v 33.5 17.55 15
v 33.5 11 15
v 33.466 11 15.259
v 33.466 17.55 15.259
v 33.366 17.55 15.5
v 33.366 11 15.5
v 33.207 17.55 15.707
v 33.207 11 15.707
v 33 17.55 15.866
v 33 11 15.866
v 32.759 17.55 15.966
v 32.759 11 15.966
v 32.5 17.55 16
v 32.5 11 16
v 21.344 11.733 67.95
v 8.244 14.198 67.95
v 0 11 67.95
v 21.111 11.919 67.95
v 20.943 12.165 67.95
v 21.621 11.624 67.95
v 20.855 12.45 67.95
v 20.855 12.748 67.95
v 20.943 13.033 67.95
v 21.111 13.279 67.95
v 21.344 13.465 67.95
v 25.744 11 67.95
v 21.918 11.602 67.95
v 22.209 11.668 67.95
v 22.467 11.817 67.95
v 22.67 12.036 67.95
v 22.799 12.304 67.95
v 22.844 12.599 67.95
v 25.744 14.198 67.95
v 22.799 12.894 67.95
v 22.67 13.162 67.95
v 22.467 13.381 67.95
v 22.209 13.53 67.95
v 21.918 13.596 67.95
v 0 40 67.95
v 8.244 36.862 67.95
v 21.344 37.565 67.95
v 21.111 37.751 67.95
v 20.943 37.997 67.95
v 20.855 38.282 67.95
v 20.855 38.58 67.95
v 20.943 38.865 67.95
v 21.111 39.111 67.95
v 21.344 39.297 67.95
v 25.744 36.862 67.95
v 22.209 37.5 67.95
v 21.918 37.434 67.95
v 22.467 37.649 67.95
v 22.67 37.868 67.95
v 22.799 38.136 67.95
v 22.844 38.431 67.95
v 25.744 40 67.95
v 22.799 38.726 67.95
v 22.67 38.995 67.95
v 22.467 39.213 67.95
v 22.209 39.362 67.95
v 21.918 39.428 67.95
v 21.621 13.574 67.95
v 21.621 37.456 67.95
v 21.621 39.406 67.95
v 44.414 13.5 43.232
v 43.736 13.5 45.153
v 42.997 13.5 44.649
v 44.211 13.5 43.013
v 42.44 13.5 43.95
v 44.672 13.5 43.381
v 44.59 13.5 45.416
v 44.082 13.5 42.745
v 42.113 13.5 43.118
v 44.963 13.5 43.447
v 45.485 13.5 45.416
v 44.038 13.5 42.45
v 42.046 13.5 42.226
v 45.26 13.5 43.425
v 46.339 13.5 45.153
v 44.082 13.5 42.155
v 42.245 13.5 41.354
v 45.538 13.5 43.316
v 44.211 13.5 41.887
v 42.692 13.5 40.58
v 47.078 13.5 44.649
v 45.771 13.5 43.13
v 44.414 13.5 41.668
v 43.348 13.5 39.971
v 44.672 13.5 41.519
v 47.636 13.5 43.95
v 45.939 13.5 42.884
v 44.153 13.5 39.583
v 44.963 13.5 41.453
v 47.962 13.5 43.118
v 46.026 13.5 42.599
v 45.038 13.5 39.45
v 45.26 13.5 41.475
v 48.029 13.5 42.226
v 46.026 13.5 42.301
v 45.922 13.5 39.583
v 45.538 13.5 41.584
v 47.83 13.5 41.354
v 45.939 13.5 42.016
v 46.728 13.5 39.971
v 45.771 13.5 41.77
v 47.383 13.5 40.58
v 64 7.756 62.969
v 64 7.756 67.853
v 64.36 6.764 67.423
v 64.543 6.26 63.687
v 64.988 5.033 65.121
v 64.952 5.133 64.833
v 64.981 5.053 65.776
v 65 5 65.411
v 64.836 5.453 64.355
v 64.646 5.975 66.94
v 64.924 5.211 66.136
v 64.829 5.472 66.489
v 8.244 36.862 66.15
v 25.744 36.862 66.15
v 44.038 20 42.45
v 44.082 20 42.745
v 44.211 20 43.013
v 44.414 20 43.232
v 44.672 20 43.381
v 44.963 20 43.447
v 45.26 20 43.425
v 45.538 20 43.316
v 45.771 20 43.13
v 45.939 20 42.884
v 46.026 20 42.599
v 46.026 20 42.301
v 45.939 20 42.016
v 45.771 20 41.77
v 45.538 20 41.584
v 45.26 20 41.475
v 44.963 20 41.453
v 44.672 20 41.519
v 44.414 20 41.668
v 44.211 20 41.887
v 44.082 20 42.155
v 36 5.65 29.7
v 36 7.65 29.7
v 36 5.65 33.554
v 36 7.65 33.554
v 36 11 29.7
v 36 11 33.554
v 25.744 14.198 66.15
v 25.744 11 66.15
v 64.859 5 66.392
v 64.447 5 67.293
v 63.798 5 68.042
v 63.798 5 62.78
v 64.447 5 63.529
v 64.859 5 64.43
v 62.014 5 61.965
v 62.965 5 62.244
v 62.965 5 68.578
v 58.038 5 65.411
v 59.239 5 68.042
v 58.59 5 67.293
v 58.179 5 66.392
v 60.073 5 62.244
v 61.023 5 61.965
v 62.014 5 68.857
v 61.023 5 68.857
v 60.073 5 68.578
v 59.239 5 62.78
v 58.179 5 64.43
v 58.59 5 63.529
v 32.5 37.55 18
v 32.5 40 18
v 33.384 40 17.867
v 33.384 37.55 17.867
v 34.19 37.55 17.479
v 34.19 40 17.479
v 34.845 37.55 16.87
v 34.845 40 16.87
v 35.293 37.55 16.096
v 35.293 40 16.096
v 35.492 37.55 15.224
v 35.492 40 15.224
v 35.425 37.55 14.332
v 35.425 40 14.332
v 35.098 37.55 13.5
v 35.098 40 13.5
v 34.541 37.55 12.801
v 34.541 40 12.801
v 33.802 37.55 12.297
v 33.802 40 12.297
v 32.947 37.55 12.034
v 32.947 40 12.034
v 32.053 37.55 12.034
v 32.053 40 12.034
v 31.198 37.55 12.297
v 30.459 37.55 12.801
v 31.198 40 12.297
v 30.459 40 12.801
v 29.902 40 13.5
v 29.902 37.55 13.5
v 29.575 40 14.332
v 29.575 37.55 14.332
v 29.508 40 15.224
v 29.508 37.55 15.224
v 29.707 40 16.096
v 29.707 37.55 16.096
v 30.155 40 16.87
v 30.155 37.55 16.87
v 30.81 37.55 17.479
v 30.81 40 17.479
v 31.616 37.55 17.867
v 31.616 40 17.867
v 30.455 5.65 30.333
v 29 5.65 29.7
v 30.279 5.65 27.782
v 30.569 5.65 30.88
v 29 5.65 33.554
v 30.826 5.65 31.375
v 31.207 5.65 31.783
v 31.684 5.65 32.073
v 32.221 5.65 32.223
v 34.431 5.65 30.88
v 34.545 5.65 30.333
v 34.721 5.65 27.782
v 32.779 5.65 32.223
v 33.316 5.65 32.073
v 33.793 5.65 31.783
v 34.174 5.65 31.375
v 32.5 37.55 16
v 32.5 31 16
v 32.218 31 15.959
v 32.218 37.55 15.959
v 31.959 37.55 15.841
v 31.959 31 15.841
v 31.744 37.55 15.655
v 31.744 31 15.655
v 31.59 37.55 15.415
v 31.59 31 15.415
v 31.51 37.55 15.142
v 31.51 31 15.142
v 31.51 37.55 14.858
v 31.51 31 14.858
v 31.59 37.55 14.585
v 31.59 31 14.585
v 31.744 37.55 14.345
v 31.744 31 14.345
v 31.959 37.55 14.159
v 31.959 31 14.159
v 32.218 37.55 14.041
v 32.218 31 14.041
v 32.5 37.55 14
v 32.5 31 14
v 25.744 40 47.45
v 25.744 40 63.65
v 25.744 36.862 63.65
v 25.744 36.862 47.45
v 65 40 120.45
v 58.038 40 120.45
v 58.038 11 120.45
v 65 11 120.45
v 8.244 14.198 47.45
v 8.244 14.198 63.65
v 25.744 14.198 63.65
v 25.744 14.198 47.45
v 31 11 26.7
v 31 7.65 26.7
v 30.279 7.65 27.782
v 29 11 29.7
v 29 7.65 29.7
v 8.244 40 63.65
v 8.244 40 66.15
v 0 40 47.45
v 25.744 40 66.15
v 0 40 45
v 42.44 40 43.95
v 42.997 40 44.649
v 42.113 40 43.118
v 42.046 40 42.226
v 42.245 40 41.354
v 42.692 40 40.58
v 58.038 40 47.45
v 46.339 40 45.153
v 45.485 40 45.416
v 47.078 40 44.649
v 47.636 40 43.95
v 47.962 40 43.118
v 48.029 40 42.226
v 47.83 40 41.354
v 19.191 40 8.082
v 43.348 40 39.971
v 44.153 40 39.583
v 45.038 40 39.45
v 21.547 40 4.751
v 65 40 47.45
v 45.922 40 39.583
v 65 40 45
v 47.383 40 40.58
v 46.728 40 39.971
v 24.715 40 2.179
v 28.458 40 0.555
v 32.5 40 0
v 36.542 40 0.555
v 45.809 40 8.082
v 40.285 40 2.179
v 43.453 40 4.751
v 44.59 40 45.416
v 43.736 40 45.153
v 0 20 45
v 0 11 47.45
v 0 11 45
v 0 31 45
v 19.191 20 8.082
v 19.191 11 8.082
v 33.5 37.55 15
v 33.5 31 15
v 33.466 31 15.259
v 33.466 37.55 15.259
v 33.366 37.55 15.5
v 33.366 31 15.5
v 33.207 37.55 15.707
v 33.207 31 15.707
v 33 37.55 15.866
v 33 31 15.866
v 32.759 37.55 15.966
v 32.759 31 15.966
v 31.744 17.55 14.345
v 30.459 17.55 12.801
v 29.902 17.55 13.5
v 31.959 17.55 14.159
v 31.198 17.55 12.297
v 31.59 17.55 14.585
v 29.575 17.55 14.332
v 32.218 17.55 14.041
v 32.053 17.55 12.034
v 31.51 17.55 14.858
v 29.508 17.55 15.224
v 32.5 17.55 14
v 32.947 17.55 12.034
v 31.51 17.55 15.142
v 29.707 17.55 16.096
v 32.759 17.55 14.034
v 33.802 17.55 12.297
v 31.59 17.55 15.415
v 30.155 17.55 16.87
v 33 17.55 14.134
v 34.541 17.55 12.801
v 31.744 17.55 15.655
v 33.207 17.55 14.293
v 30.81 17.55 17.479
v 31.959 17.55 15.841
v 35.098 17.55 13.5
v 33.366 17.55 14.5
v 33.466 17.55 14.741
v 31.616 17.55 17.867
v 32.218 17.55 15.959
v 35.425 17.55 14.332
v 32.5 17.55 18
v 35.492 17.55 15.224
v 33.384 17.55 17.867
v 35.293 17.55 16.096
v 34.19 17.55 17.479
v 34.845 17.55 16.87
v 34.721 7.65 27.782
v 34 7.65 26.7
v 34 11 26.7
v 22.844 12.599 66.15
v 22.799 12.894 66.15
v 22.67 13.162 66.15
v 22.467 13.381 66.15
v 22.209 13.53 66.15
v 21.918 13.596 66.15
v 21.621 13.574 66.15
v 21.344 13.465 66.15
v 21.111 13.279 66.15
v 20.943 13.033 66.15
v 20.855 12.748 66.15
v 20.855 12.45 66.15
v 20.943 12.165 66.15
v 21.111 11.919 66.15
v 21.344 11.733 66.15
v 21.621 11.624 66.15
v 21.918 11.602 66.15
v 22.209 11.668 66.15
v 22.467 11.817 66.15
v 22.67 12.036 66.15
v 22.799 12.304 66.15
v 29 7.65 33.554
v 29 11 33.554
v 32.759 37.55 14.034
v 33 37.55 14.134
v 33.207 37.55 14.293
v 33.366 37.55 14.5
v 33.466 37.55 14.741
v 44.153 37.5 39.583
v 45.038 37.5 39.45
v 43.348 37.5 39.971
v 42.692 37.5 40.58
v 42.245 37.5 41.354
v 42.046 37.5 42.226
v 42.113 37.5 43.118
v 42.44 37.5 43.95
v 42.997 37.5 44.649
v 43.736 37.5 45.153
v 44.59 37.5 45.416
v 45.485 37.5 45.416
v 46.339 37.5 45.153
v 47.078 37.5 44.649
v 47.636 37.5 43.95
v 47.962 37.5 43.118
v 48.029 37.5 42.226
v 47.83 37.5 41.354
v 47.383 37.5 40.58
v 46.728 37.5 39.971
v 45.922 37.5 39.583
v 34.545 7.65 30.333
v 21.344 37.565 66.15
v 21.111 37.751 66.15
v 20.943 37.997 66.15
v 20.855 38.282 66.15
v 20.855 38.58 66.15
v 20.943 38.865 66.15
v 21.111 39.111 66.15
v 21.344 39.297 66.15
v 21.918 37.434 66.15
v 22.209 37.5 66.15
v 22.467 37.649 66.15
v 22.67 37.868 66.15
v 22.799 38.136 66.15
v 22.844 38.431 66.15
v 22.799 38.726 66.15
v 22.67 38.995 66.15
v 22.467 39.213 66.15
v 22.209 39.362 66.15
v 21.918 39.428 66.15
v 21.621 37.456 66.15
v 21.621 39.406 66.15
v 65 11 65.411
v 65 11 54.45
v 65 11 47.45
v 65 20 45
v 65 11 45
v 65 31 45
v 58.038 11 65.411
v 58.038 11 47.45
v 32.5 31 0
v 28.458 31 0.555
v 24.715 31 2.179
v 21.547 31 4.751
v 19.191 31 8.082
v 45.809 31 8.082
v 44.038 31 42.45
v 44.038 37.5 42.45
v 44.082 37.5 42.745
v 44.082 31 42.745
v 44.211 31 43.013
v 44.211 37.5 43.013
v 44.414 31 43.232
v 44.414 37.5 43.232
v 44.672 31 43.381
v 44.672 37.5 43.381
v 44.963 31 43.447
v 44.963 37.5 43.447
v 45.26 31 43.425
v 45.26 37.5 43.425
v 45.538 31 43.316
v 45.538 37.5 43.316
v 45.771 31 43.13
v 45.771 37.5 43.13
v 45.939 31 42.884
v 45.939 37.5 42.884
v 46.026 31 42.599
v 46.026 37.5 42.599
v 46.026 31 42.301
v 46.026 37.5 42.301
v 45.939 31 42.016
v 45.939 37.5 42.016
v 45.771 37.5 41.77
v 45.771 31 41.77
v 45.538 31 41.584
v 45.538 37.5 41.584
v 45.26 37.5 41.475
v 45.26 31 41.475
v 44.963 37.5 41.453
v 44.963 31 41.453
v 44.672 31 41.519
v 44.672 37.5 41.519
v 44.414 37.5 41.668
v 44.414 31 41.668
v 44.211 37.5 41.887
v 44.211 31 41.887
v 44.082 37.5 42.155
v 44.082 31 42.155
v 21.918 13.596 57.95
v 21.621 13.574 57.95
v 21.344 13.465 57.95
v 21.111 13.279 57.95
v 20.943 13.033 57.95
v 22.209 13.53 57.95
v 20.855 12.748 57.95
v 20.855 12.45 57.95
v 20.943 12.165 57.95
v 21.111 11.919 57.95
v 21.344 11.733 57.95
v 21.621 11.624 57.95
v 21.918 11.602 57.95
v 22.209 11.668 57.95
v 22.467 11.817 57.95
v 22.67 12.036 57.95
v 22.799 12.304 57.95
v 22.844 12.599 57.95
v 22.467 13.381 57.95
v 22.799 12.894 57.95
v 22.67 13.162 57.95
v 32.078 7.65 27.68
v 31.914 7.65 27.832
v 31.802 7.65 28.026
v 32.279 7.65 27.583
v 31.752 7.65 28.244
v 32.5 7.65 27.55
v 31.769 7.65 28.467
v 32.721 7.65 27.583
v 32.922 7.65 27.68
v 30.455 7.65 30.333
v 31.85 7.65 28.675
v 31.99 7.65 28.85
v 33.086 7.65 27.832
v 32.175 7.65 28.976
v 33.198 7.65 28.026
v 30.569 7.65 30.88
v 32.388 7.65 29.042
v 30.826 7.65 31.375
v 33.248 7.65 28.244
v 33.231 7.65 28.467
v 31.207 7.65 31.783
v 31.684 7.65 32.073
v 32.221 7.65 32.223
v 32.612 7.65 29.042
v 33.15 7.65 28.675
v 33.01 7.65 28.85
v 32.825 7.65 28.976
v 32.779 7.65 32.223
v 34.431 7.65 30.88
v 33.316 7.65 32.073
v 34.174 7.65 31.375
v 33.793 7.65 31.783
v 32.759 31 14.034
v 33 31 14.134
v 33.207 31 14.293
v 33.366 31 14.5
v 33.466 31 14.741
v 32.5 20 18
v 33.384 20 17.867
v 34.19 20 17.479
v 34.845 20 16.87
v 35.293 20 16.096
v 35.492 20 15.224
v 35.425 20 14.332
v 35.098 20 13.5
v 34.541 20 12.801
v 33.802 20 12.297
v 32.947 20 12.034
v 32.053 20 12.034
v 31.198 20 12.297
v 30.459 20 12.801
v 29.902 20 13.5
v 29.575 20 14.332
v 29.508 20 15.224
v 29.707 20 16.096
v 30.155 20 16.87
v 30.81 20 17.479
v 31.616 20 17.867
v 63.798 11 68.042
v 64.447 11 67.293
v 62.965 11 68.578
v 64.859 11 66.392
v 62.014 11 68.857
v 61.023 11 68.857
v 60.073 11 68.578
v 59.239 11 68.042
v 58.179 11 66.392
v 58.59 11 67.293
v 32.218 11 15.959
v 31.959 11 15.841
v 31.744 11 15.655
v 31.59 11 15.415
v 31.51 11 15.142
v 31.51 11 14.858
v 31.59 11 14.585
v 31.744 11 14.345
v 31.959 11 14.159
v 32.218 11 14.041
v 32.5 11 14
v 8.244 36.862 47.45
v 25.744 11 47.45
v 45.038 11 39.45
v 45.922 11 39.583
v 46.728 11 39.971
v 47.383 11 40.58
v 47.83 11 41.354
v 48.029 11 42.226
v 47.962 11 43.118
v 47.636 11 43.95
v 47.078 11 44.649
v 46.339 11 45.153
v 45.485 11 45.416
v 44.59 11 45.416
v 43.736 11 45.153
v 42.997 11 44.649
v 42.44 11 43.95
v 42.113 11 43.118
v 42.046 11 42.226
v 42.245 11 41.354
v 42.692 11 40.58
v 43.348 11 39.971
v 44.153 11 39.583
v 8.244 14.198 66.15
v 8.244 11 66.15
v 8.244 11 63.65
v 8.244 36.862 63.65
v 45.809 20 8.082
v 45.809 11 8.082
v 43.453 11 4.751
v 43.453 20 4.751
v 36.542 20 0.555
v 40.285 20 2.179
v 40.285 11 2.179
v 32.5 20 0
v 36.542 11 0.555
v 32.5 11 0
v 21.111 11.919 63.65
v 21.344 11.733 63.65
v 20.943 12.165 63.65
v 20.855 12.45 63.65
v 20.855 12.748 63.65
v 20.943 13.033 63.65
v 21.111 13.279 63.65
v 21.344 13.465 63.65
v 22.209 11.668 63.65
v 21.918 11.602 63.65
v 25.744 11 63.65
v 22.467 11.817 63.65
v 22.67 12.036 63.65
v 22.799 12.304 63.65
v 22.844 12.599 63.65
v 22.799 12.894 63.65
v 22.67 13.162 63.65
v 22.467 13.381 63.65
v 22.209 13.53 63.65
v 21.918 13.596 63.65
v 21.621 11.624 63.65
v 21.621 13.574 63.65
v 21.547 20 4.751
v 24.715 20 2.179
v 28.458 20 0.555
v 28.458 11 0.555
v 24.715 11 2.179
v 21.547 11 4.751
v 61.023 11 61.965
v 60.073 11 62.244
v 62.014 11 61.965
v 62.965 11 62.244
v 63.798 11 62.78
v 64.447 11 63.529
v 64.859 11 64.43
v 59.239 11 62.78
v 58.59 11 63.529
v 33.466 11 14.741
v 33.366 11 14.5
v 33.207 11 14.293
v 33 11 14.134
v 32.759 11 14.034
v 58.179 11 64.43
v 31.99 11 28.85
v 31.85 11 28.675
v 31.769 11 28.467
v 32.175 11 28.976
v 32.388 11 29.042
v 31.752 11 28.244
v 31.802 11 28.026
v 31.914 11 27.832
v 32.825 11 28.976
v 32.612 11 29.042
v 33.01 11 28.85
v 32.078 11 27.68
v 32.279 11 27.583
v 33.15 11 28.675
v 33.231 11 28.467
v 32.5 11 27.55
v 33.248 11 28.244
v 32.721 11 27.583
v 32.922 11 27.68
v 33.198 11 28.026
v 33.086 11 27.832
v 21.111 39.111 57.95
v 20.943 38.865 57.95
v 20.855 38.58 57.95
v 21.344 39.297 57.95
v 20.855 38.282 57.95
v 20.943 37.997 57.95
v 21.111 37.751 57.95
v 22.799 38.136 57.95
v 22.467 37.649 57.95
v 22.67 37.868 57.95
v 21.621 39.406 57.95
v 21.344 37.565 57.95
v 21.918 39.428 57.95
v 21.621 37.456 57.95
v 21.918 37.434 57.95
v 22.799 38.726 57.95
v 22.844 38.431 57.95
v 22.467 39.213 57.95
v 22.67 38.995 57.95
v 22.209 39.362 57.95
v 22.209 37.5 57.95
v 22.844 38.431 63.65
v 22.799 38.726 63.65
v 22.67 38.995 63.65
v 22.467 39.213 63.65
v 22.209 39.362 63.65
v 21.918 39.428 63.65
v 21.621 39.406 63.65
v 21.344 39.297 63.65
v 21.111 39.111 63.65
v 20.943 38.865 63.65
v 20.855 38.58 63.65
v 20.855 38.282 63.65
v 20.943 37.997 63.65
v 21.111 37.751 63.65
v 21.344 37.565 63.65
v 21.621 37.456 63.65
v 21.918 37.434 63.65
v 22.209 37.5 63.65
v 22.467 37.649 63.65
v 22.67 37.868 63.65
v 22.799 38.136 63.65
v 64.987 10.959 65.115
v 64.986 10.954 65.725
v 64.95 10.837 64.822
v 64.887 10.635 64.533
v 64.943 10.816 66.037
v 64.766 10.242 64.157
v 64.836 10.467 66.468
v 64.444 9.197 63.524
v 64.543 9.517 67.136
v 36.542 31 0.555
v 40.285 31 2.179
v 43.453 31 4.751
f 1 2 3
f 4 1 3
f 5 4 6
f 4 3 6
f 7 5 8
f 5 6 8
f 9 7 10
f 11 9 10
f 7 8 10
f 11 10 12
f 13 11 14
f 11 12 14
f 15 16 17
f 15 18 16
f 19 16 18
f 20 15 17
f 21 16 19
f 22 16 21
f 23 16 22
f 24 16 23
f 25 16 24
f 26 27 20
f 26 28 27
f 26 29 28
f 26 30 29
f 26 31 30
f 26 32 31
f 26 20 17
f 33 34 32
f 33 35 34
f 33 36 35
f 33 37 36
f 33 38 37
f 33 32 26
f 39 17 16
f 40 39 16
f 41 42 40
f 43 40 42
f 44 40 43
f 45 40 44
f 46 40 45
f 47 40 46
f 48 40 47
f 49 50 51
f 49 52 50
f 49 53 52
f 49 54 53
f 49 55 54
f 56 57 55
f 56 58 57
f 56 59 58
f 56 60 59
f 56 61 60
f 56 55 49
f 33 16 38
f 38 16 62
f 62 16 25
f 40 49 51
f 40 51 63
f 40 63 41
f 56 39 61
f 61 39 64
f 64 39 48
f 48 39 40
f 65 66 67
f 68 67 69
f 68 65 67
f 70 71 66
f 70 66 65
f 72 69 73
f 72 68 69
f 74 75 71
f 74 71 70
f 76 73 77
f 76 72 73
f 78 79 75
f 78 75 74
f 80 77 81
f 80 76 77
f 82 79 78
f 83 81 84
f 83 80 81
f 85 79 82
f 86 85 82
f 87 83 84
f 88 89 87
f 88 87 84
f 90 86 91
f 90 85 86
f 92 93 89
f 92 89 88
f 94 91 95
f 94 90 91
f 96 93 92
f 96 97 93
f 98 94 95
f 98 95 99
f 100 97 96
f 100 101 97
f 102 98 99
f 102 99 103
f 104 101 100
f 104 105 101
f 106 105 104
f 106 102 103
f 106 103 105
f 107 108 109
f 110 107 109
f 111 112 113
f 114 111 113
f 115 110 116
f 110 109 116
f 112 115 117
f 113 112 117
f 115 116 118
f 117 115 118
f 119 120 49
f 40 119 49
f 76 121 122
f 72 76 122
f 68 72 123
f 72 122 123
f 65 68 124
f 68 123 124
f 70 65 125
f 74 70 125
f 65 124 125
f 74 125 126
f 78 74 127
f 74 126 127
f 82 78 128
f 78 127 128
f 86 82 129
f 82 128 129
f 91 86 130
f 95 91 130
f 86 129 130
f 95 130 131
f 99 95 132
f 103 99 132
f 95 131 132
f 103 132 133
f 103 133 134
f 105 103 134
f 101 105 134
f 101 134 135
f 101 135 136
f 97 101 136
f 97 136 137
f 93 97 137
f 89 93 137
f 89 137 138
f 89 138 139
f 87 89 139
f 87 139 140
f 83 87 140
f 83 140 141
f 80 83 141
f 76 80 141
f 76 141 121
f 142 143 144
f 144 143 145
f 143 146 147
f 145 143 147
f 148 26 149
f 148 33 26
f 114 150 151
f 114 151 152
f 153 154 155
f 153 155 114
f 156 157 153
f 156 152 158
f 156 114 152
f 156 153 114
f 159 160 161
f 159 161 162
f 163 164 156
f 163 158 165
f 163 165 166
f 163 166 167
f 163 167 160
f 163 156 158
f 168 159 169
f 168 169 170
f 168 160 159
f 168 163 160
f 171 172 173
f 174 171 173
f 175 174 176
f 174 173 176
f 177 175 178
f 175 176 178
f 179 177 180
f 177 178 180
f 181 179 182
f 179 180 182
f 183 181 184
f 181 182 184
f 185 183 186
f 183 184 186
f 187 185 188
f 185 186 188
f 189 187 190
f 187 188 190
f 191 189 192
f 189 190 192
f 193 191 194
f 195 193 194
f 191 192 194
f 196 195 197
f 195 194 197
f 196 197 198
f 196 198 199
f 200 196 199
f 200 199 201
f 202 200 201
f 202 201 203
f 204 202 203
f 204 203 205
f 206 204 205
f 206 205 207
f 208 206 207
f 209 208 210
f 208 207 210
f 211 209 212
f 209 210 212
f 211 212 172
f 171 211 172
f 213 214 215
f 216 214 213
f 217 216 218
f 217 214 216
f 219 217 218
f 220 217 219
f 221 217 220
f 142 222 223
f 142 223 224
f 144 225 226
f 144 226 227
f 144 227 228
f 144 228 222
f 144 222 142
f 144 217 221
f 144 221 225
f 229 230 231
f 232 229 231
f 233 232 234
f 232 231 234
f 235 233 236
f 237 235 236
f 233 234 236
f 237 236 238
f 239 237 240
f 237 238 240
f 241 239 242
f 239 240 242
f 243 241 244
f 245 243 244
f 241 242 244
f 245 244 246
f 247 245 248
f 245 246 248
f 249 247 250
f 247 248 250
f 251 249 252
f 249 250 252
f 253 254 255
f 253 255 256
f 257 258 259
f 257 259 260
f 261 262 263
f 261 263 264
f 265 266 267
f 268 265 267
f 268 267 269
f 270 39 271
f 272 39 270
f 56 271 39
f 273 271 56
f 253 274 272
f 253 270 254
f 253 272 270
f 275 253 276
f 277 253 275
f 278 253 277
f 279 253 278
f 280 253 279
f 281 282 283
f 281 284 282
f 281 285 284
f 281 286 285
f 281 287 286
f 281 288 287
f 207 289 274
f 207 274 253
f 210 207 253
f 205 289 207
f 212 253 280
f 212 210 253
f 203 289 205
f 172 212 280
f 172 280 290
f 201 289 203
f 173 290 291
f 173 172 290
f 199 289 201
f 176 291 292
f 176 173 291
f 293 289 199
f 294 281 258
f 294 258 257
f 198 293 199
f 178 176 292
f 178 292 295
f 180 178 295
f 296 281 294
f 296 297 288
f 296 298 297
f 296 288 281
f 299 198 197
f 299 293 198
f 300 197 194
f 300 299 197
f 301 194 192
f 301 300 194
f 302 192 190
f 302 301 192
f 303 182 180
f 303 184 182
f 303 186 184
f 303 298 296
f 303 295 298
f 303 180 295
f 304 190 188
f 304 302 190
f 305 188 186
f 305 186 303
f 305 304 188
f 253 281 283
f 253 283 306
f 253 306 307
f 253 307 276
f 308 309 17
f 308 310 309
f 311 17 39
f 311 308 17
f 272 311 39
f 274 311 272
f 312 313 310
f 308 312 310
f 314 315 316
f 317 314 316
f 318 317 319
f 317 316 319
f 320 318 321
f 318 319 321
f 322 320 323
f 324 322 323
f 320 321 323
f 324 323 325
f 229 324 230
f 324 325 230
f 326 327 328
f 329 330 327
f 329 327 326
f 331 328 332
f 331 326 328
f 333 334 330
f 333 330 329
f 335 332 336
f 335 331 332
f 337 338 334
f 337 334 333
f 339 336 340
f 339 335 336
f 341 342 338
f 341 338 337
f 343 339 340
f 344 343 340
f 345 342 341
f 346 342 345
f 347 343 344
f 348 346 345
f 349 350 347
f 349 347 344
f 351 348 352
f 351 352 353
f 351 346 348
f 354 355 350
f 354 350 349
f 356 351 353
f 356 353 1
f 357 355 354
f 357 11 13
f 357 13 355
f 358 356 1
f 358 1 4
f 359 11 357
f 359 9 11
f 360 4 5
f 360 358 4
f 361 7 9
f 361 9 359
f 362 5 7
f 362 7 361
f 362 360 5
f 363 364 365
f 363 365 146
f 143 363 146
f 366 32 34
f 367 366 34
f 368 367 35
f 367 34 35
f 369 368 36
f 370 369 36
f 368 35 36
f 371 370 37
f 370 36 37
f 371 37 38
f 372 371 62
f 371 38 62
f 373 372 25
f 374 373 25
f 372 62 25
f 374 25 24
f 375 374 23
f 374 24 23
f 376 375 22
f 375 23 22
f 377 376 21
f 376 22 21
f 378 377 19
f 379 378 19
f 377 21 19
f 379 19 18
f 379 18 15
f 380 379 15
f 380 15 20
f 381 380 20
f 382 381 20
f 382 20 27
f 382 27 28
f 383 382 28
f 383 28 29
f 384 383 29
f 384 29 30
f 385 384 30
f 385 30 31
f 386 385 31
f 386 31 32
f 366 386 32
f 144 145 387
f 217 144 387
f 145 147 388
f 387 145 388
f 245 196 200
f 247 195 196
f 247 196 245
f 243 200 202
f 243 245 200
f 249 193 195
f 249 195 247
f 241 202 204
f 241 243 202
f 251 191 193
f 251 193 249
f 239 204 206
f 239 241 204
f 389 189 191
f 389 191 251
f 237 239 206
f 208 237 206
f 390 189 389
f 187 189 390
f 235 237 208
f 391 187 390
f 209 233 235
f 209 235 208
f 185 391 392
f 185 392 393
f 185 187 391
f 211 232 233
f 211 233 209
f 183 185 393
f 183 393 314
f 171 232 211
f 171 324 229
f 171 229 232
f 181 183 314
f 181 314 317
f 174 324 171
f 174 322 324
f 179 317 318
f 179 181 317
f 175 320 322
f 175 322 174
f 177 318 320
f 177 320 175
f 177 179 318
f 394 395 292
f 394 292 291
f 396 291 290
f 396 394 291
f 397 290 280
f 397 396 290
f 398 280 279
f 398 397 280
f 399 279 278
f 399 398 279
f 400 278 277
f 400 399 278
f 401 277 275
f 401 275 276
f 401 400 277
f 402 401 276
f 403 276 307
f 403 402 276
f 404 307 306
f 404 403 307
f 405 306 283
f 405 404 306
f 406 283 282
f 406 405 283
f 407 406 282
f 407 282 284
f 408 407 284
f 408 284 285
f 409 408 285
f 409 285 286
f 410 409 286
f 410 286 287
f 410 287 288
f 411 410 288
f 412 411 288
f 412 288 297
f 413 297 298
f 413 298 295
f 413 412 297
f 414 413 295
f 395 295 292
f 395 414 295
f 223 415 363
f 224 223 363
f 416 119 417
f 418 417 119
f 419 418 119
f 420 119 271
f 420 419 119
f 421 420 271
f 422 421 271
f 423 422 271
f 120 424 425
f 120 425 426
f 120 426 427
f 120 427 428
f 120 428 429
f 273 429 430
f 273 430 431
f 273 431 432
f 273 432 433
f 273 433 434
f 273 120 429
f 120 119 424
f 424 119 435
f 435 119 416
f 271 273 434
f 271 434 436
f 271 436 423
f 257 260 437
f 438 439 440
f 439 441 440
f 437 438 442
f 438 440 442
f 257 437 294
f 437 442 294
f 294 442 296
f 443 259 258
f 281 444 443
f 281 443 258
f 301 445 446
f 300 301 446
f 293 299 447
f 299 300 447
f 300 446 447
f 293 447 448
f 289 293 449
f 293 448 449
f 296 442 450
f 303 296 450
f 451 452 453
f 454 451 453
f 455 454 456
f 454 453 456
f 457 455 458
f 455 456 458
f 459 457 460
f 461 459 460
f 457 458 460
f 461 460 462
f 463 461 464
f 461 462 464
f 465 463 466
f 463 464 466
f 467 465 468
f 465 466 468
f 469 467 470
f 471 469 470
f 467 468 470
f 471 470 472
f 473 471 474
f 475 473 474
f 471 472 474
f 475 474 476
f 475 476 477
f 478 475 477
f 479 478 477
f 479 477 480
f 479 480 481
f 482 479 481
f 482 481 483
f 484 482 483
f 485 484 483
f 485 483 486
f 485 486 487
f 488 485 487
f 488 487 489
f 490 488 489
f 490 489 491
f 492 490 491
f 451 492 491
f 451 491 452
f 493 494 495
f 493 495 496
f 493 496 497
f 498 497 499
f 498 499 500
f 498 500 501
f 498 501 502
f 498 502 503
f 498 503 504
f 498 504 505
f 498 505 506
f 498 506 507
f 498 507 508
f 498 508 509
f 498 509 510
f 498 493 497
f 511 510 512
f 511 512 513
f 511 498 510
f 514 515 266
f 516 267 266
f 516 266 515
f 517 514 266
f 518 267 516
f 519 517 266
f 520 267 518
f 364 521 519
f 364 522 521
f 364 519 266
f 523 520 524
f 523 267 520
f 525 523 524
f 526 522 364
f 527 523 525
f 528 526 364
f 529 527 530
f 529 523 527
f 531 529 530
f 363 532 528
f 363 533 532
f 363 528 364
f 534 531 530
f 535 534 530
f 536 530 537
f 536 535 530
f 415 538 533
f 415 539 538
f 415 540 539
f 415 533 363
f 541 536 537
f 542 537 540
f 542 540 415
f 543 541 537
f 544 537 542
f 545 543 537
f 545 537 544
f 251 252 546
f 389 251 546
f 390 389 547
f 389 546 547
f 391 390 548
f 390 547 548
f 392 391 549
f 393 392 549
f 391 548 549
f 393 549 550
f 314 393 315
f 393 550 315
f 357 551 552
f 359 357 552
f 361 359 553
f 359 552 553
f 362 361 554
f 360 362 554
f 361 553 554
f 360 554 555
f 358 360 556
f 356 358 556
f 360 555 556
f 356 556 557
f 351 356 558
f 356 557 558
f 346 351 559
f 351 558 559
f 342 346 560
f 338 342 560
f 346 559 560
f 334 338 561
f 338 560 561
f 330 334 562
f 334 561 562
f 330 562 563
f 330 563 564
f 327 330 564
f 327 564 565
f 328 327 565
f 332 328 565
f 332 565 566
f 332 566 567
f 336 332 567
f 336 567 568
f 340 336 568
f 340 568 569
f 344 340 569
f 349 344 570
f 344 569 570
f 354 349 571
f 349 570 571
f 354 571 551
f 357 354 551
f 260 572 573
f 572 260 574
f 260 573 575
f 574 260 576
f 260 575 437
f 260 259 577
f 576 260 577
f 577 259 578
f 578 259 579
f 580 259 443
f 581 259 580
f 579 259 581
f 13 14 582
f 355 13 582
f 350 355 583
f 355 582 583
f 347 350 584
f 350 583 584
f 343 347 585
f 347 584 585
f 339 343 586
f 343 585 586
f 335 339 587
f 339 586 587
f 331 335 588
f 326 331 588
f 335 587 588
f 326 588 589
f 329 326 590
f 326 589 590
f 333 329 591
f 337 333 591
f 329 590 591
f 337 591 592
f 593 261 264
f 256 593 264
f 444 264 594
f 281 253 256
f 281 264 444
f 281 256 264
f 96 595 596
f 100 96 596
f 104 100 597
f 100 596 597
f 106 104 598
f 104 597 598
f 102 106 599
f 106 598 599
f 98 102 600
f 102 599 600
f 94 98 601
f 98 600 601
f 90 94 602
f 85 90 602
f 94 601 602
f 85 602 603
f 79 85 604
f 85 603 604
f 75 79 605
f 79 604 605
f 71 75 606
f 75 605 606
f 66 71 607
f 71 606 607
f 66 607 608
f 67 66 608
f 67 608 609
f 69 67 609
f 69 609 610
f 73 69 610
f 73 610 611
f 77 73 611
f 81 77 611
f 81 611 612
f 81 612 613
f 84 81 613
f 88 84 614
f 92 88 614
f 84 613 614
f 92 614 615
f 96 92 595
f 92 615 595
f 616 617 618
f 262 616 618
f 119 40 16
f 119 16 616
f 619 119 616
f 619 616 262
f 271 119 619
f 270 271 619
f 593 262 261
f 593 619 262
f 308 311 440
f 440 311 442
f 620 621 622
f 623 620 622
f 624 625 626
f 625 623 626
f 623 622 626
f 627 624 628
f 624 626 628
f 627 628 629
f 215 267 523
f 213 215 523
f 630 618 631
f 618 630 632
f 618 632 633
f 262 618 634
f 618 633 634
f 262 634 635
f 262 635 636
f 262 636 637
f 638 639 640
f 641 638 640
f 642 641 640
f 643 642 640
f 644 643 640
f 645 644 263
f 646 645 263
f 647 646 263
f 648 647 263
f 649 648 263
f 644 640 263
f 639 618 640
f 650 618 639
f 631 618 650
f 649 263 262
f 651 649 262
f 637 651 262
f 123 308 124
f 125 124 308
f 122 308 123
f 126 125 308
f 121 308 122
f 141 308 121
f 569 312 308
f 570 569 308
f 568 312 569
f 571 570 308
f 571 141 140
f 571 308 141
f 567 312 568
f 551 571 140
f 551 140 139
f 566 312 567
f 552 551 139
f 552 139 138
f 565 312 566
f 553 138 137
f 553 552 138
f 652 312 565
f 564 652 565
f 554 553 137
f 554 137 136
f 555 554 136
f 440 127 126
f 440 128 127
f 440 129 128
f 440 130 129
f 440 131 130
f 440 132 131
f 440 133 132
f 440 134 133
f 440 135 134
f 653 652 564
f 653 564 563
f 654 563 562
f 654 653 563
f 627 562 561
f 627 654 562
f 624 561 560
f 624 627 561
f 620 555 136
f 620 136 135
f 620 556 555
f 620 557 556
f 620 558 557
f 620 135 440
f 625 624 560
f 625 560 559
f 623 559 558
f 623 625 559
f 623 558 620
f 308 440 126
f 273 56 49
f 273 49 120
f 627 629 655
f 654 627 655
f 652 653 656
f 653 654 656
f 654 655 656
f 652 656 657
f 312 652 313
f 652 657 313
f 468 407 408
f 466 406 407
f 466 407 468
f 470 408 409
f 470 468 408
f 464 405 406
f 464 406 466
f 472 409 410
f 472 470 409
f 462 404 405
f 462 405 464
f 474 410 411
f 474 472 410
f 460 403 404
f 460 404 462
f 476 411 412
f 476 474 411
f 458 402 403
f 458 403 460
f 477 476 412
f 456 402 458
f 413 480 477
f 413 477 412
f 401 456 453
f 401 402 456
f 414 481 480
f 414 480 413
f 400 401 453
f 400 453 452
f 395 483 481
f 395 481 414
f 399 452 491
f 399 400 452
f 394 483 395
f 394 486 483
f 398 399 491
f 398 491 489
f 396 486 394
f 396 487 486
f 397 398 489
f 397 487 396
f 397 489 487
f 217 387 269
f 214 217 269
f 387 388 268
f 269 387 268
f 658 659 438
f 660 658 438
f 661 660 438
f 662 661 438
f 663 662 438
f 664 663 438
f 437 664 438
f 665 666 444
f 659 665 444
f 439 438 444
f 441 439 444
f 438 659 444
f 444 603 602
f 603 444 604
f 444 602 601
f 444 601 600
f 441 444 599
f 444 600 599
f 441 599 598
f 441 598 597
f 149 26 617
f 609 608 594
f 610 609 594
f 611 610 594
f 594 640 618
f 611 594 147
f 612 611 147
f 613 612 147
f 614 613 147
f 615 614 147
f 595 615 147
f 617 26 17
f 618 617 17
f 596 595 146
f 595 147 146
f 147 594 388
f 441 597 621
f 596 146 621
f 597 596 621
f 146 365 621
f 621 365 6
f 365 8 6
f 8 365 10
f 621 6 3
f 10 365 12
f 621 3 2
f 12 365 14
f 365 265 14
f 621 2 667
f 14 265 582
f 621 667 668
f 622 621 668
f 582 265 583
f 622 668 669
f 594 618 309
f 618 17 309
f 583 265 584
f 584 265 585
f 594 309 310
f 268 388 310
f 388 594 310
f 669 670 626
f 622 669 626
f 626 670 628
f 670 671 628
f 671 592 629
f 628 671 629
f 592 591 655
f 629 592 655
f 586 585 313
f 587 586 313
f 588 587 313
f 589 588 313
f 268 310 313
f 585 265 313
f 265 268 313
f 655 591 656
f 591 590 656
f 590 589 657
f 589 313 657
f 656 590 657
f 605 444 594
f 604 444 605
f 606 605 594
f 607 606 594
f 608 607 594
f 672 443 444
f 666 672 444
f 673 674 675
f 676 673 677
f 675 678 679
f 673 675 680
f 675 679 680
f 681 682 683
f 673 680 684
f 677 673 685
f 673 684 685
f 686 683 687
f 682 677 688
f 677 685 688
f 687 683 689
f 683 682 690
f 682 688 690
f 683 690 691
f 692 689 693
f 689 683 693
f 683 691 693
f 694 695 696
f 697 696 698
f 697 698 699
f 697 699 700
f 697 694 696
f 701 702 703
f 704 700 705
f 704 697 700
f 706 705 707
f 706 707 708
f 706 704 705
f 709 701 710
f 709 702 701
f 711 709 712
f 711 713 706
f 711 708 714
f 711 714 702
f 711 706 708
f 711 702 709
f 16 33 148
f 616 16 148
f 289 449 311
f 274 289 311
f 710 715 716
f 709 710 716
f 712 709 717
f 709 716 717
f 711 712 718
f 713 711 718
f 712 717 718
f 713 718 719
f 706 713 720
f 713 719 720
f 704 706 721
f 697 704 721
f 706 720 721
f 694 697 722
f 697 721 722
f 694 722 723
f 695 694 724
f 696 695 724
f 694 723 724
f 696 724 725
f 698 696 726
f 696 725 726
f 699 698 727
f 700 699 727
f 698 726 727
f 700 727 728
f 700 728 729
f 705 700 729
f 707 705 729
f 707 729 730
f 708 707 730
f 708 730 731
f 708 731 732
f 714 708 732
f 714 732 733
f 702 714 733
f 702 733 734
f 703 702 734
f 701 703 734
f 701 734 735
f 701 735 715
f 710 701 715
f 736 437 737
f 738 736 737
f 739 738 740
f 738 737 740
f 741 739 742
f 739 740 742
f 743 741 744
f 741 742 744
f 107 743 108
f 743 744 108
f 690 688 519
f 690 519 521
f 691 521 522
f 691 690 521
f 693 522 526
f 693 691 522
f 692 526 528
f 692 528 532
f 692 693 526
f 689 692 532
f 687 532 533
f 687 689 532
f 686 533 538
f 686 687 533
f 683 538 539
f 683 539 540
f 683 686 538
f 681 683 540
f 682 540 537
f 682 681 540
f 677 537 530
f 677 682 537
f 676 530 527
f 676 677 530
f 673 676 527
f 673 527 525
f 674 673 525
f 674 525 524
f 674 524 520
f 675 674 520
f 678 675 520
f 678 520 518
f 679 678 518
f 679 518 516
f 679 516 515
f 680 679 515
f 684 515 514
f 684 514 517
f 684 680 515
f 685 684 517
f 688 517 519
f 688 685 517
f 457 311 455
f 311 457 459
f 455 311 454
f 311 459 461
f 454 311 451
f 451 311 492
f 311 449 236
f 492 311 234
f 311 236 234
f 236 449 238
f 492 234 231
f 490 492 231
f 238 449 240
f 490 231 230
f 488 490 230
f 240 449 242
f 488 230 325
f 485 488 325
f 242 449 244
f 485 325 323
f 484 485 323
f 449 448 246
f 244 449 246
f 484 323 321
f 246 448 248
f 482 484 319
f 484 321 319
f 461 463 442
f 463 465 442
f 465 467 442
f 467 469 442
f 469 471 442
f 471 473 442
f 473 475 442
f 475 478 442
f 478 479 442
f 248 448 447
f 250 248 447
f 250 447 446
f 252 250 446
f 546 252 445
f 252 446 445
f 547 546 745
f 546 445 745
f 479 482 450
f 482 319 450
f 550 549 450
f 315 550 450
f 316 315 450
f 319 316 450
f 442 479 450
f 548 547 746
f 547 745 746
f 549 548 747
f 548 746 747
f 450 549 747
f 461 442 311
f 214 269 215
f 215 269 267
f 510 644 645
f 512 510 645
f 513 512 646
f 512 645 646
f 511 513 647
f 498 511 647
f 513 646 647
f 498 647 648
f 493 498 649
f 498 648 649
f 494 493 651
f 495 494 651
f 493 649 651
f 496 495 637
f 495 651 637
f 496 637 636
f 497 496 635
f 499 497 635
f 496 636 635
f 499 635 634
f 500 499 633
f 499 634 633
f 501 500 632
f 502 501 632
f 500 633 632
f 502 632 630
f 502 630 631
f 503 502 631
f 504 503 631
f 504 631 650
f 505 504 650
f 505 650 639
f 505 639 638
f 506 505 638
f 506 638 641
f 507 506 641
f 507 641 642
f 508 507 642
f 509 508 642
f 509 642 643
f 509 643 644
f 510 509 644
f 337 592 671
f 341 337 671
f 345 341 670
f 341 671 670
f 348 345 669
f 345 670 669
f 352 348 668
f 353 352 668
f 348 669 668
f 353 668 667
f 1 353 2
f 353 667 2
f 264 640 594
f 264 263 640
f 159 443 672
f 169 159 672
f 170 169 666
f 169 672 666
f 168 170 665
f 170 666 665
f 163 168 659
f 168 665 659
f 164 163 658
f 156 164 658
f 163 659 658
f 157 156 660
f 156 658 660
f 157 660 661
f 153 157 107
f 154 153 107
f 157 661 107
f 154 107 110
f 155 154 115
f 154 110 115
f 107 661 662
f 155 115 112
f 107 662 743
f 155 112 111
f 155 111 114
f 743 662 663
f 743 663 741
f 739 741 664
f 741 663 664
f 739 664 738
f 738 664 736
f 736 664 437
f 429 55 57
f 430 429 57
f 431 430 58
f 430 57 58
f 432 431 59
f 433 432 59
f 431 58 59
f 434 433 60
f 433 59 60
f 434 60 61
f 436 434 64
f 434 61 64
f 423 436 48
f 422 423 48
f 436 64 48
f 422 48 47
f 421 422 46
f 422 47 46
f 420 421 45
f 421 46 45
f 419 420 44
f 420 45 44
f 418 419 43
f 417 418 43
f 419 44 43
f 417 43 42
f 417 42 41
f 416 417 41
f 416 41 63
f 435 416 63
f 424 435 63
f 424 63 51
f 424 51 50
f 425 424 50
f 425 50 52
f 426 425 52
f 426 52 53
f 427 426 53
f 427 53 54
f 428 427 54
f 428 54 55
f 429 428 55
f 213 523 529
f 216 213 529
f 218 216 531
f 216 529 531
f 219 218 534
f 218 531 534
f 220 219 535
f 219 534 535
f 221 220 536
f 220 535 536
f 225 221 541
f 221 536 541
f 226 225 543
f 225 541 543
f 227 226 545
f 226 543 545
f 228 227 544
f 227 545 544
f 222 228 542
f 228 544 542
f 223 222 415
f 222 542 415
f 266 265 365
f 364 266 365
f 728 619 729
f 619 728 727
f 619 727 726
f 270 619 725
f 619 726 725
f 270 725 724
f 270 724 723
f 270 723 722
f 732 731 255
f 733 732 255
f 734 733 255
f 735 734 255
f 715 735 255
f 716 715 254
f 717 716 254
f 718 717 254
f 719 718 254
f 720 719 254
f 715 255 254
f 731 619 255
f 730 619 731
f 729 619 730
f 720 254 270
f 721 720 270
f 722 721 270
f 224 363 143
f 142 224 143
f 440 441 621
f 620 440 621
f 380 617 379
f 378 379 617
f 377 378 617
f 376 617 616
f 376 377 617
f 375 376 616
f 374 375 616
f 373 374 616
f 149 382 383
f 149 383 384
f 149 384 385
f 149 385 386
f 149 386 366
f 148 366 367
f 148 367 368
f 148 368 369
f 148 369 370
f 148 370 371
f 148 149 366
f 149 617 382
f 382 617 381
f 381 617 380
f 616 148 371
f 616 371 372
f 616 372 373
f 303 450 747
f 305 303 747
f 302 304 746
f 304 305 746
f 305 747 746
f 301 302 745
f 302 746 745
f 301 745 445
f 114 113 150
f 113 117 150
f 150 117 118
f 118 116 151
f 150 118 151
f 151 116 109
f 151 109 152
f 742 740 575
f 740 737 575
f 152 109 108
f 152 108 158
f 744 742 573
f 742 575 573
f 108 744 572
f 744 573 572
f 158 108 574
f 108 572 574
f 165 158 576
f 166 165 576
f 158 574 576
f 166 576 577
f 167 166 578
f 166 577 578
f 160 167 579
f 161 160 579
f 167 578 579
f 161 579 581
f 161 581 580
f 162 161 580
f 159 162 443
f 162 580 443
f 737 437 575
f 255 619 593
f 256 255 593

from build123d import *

# Parameters (mm, degrees)
SKETCH1_W             = 65
SKETCH1_H             = 9
BOSS_EXTRUDE1_DEPTH   = 45
BOSS_EXTRUDE1_2_DEPTH = 45
SKETCH2_R             = 1
CUT_EXTRUDE5_DEPTH    = 34
CUT_EXTRUDE6_DEPTH    = 34
SKETCH3_R             = 3
CUT_EXTRUDE7_DEPTH    = 2.45
SKETCH4_R             = 3
CUT_EXTRUDE8_DEPTH    = 2.45
SKETCH5_W             = 65
SKETCH5_H             = 29
BOSS_EXTRUDE2_DEPTH   = 2.45
SKETCH6_W             = 7
SKETCH6_H             = 6.853915881
SKETCH6_R             = 0.75
BOSS_EXTRUDE3_DEPTH   = 3.35
CUT_EXTRUDE9_DEPTH    = 3.35
BOSS_EXTRUDE4_DEPTH   = 2
SKETCH9_W             = 6.962412957
SKETCH9_H             = 29
BOSS_EXTRUDE5_DEPTH   = 73
SKETCH10_R            = 3
CUT_EXTRUDE10_DEPTH   = 2.5
CUT_EXTRUDE11_START   = -2.5
SKETCH11_R            = 3
CUT_EXTRUDE11_DEPTH   = 2.5
SKETCH12_R            = 1
CUT_EXTRUDE12_DEPTH   = 32.5
SKETCH13_W            = 25.743716973
SKETCH13_H            = 29
BOSS_EXTRUDE6_DEPTH   = 20.5
SKETCH14_W            = 16.2
SKETCH14_H            = 32.7
CUT_EXTRUDE13_DEPTH   = 17.5
SKETCH16_W            = 16.2
SKETCH16_H            = 3.197897976
SKETCH16_H_2          = 3.137509592
BOSS_EXTRUDE7_DEPTH   = 17.5
CUT_EXTRUDE14_DEPTH   = 17.5
SKETCH19_R            = 1
CUT_EXTRUDE15_DEPTH   = 10
SKETCH20_R            = 3.481206478
BOSS_EXTRUDE8_DEPTH   = 6
CUT_EXTRUDE17_DEPTH   = 66


with BuildPart() as part:
    # Sketch1 → Boss-Extrude1 (new body)
    with BuildSketch(Plane.XY):
        with Locations((32.5, 15.5)):
            Rectangle(SKETCH1_W, SKETCH1_H)
    extrude(amount=BOSS_EXTRUDE1_DEPTH)


with BuildPart() as body_2:
    # Sketch1 → Boss-Extrude1 2 (new body)
    with BuildSketch(Plane.XY):
        with Locations((32.5, 35.5)):
            Rectangle(SKETCH1_W, SKETCH1_H)
    extrude(amount=BOSS_EXTRUDE1_2_DEPTH)


with BuildPart() as cut_extrude5_tool:
    # Sketch2 → Cut-Extrude5 (new body)
    with BuildSketch(Plane.XZ.offset(-10)):
        with BuildLine():
            ThreePointArc((45.80925577, 8.081639583), (40.285389963, 2.178623197), (32.5, 0))
            Line((32.5, 0), (65, 0))
            Line((65, 0), (65, 45))
            Line((65, 45), (45.80925577, 8.081639583))
        make_face()
        with Locations((32.5, 15)):
            Circle(SKETCH2_R)
    extrude(amount=-CUT_EXTRUDE5_DEPTH)


with BuildPart() as part_1:
    add(part.part)

    # Cut-Extrude5: cut by cut_extrude5_tool
    add(cut_extrude5_tool.part, mode=Mode.SUBTRACT)


with BuildPart() as body_2_1:
    add(body_2.part)

    # Cut-Extrude5: cut by cut_extrude5_tool
    add(cut_extrude5_tool.part, mode=Mode.SUBTRACT)


with BuildPart() as cut_extrude6_tool:
    # Sketch2<6> → Cut-Extrude6 (new body)
    with BuildSketch(Plane.XZ.offset(-10)):
        with BuildLine():
            Line((19.19074423, 8.081639583), (0, 45))
            Line((0, 45), (0, 0))
            Line((0, 0), (32.5, 0))
            ThreePointArc((32.5, 0), (24.714610037, 2.178623197), (19.19074423, 8.081639583))
        make_face()
    extrude(amount=-CUT_EXTRUDE6_DEPTH)


with BuildPart() as part_2:
    add(part_1.part)

    # Cut-Extrude6: cut by cut_extrude6_tool
    add(cut_extrude6_tool.part, mode=Mode.SUBTRACT)

    # Sketch4 → Cut-Extrude8 (cut)
    with BuildSketch(Plane(origin=(0, 20, 0), x_dir=(1, 0, 0), z_dir=(0, 1, 0))):
        with Locations((32.5, -15)):
            Circle(SKETCH4_R)
    extrude(amount=-CUT_EXTRUDE8_DEPTH, mode=Mode.SUBTRACT)



with BuildPart() as body_2_2:
    add(body_2_1.part)

    # Cut-Extrude6: cut by cut_extrude6_tool
    add(cut_extrude6_tool.part, mode=Mode.SUBTRACT)

    # Sketch3 → Cut-Extrude7 (cut)
    with BuildSketch(Plane(origin=(0, 40, 0), x_dir=(1, 0, 0), z_dir=(0, 1, 0))):
        with Locations((32.5, -15)):
            Circle(SKETCH3_R)
    extrude(amount=-CUT_EXTRUDE7_DEPTH, mode=Mode.SUBTRACT)


with BuildPart() as part_3:
    add(part_2.part)

    add(body_2_2.part)  # Boss-Extrude2 merges body 2
    # Sketch5 → Boss-Extrude2 (add)
    with BuildSketch(Plane.XY.offset(45)):
        with Locations((32.5, 25.5)):
            Rectangle(SKETCH5_W, SKETCH5_H)
    extrude(amount=BOSS_EXTRUDE2_DEPTH)

    # Sketch6 → Boss-Extrude3 (add)
    with BuildSketch(Plane.XZ.offset(-11)):
        with Locations((32.5, 30.126957941)):
            Rectangle(SKETCH6_W, SKETCH6_H)
        with Locations((32.5, 28.3)):
            Circle(SKETCH6_R, mode=Mode.SUBTRACT)
    extrude(amount=BOSS_EXTRUDE3_DEPTH)

    # Sketch7 → Cut-Extrude9 (cut)
    with BuildSketch(Plane.XZ.offset(-7.65)):
        Polygon((29, 29.7), (29, 26.7), (31, 26.7), align=None)
        Polygon((34, 26.7), (36, 29.7), (36, 26.7), align=None)
    extrude(amount=-CUT_EXTRUDE9_DEPTH, mode=Mode.SUBTRACT)

    # Sketch8 → Boss-Extrude4 (add)
    with BuildSketch(Plane.XZ.offset(-7.65)):
        with BuildLine():
            ThreePointArc((30.454857608, 30.333257), (32.5, 32.242215881), (34.545142392, 30.333257))
            Line((34.545142392, 30.333257), (34.721110255, 27.781665383))
            Line((34.721110255, 27.781665383), (36, 29.7))
            Line((36, 29.7), (36, 33.553915881))
            Line((36, 33.553915881), (29, 33.553915881))
            Line((29, 33.553915881), (29, 29.7))
            Line((29, 29.7), (30.278889745, 27.781665383))
            Line((30.278889745, 27.781665383), (30.454857608, 30.333257))
        make_face()
    extrude(amount=BOSS_EXTRUDE4_DEPTH)

    # Sketch9 → Boss-Extrude5 (add)
    with BuildSketch(Plane.XY.offset(47.45)):
        with Locations((61.518793522, 25.5)):
            Rectangle(SKETCH9_W, SKETCH9_H)
    extrude(amount=BOSS_EXTRUDE5_DEPTH)

    # Sketch10 → Cut-Extrude10 (cut)
    with BuildSketch(Plane.XZ.offset(-11)):
        with Locations((45.037587043, 42.45)):
            Circle(SKETCH10_R)
    extrude(amount=-CUT_EXTRUDE10_DEPTH, mode=Mode.SUBTRACT)

    # Sketch11 → Cut-Extrude11 (cut)
    with BuildSketch(Plane(origin=(0, 40, 0), x_dir=(1, 0, 0), z_dir=(0, 1, 0)).offset(CUT_EXTRUDE11_START)):
        with Locations((45.037587043, -42.45)):
            Circle(SKETCH11_R)
    extrude(amount=CUT_EXTRUDE11_DEPTH, mode=Mode.SUBTRACT)

    # Sketch12 → Cut-Extrude12 (cut)
    with BuildSketch(Plane(origin=(0, 37.5, 0), x_dir=(1, 0, 0), z_dir=(0, 1, 0))):
        with Locations((45.037587043, -42.45)):
            Circle(SKETCH12_R)
    extrude(amount=-CUT_EXTRUDE12_DEPTH, mode=Mode.SUBTRACT)

    # Sketch13 → Boss-Extrude6 (add)
    with BuildSketch(Plane.XY.offset(47.45)):
        with Locations((12.871858487, 25.5)):
            Rectangle(SKETCH13_W, SKETCH13_H)
    extrude(amount=BOSS_EXTRUDE6_DEPTH)

    # Sketch14 → Cut-Extrude13 (cut)
    with BuildSketch(Plane(origin=(25.743716973, 0, 0), x_dir=(0, 0, -1), z_dir=(1, 0, 0))):
        with Locations((-55.55, 25.5)):
            Rectangle(SKETCH14_W, SKETCH14_H)
    extrude(amount=-CUT_EXTRUDE13_DEPTH, mode=Mode.SUBTRACT)

    # Sketch16 → Boss-Extrude7 (add)
    with BuildSketch(Plane(origin=(8.243716973, 0, 0), x_dir=(0, 0, -1), z_dir=(1, 0, 0))):
        with Locations((-55.55, 12.598948988)):
            Rectangle(SKETCH16_W, SKETCH16_H)
        with Locations((-55.55, 38.431245204)):
            Rectangle(SKETCH16_W, SKETCH16_H_2)
    extrude(amount=BOSS_EXTRUDE7_DEPTH)

    # Sketch17 → Cut-Extrude14 (cut)
    with BuildSketch(Plane(origin=(25.743716973, 0, 0), x_dir=(0, 0, -1), z_dir=(1, 0, 0))):
        Polygon((-66.15, 14.197897976), (-66.15, 11), (-63.65, 11), (-63.65, 40), (-66.15, 40), (-66.15, 36.862490408), (-67.95, 36.862490408), (-67.95, 14.197897976), align=None)
    extrude(amount=-CUT_EXTRUDE14_DEPTH, mode=Mode.SUBTRACT)

    # Sketch19 → Cut-Extrude15 (cut)
    with BuildSketch(Plane.XY.offset(67.95)):
        with Locations((21.843716973, 12.598948988)):
            Circle(SKETCH19_R)
        with Locations((21.843716973, 38.431245204)):
            Circle(SKETCH19_R)
    extrude(amount=-CUT_EXTRUDE15_DEPTH, mode=Mode.SUBTRACT)

    # Sketch20 → Boss-Extrude8 (add)
    with BuildSketch(Plane.XZ.offset(-11)):
        with Locations((61.518793522, 65.411058123)):
            Circle(SKETCH20_R)
    extrude(amount=BOSS_EXTRUDE8_DEPTH)

    # Sketch22 → Cut-Extrude17 (cut)
    with BuildSketch(Plane.XY.offset(120.45)):
        Polygon((65, 11), (64, 7.755866492), (65, 5), align=None)
    extrude(amount=-CUT_EXTRUDE17_DEPTH, mode=Mode.SUBTRACT)


solid = part_3.part
